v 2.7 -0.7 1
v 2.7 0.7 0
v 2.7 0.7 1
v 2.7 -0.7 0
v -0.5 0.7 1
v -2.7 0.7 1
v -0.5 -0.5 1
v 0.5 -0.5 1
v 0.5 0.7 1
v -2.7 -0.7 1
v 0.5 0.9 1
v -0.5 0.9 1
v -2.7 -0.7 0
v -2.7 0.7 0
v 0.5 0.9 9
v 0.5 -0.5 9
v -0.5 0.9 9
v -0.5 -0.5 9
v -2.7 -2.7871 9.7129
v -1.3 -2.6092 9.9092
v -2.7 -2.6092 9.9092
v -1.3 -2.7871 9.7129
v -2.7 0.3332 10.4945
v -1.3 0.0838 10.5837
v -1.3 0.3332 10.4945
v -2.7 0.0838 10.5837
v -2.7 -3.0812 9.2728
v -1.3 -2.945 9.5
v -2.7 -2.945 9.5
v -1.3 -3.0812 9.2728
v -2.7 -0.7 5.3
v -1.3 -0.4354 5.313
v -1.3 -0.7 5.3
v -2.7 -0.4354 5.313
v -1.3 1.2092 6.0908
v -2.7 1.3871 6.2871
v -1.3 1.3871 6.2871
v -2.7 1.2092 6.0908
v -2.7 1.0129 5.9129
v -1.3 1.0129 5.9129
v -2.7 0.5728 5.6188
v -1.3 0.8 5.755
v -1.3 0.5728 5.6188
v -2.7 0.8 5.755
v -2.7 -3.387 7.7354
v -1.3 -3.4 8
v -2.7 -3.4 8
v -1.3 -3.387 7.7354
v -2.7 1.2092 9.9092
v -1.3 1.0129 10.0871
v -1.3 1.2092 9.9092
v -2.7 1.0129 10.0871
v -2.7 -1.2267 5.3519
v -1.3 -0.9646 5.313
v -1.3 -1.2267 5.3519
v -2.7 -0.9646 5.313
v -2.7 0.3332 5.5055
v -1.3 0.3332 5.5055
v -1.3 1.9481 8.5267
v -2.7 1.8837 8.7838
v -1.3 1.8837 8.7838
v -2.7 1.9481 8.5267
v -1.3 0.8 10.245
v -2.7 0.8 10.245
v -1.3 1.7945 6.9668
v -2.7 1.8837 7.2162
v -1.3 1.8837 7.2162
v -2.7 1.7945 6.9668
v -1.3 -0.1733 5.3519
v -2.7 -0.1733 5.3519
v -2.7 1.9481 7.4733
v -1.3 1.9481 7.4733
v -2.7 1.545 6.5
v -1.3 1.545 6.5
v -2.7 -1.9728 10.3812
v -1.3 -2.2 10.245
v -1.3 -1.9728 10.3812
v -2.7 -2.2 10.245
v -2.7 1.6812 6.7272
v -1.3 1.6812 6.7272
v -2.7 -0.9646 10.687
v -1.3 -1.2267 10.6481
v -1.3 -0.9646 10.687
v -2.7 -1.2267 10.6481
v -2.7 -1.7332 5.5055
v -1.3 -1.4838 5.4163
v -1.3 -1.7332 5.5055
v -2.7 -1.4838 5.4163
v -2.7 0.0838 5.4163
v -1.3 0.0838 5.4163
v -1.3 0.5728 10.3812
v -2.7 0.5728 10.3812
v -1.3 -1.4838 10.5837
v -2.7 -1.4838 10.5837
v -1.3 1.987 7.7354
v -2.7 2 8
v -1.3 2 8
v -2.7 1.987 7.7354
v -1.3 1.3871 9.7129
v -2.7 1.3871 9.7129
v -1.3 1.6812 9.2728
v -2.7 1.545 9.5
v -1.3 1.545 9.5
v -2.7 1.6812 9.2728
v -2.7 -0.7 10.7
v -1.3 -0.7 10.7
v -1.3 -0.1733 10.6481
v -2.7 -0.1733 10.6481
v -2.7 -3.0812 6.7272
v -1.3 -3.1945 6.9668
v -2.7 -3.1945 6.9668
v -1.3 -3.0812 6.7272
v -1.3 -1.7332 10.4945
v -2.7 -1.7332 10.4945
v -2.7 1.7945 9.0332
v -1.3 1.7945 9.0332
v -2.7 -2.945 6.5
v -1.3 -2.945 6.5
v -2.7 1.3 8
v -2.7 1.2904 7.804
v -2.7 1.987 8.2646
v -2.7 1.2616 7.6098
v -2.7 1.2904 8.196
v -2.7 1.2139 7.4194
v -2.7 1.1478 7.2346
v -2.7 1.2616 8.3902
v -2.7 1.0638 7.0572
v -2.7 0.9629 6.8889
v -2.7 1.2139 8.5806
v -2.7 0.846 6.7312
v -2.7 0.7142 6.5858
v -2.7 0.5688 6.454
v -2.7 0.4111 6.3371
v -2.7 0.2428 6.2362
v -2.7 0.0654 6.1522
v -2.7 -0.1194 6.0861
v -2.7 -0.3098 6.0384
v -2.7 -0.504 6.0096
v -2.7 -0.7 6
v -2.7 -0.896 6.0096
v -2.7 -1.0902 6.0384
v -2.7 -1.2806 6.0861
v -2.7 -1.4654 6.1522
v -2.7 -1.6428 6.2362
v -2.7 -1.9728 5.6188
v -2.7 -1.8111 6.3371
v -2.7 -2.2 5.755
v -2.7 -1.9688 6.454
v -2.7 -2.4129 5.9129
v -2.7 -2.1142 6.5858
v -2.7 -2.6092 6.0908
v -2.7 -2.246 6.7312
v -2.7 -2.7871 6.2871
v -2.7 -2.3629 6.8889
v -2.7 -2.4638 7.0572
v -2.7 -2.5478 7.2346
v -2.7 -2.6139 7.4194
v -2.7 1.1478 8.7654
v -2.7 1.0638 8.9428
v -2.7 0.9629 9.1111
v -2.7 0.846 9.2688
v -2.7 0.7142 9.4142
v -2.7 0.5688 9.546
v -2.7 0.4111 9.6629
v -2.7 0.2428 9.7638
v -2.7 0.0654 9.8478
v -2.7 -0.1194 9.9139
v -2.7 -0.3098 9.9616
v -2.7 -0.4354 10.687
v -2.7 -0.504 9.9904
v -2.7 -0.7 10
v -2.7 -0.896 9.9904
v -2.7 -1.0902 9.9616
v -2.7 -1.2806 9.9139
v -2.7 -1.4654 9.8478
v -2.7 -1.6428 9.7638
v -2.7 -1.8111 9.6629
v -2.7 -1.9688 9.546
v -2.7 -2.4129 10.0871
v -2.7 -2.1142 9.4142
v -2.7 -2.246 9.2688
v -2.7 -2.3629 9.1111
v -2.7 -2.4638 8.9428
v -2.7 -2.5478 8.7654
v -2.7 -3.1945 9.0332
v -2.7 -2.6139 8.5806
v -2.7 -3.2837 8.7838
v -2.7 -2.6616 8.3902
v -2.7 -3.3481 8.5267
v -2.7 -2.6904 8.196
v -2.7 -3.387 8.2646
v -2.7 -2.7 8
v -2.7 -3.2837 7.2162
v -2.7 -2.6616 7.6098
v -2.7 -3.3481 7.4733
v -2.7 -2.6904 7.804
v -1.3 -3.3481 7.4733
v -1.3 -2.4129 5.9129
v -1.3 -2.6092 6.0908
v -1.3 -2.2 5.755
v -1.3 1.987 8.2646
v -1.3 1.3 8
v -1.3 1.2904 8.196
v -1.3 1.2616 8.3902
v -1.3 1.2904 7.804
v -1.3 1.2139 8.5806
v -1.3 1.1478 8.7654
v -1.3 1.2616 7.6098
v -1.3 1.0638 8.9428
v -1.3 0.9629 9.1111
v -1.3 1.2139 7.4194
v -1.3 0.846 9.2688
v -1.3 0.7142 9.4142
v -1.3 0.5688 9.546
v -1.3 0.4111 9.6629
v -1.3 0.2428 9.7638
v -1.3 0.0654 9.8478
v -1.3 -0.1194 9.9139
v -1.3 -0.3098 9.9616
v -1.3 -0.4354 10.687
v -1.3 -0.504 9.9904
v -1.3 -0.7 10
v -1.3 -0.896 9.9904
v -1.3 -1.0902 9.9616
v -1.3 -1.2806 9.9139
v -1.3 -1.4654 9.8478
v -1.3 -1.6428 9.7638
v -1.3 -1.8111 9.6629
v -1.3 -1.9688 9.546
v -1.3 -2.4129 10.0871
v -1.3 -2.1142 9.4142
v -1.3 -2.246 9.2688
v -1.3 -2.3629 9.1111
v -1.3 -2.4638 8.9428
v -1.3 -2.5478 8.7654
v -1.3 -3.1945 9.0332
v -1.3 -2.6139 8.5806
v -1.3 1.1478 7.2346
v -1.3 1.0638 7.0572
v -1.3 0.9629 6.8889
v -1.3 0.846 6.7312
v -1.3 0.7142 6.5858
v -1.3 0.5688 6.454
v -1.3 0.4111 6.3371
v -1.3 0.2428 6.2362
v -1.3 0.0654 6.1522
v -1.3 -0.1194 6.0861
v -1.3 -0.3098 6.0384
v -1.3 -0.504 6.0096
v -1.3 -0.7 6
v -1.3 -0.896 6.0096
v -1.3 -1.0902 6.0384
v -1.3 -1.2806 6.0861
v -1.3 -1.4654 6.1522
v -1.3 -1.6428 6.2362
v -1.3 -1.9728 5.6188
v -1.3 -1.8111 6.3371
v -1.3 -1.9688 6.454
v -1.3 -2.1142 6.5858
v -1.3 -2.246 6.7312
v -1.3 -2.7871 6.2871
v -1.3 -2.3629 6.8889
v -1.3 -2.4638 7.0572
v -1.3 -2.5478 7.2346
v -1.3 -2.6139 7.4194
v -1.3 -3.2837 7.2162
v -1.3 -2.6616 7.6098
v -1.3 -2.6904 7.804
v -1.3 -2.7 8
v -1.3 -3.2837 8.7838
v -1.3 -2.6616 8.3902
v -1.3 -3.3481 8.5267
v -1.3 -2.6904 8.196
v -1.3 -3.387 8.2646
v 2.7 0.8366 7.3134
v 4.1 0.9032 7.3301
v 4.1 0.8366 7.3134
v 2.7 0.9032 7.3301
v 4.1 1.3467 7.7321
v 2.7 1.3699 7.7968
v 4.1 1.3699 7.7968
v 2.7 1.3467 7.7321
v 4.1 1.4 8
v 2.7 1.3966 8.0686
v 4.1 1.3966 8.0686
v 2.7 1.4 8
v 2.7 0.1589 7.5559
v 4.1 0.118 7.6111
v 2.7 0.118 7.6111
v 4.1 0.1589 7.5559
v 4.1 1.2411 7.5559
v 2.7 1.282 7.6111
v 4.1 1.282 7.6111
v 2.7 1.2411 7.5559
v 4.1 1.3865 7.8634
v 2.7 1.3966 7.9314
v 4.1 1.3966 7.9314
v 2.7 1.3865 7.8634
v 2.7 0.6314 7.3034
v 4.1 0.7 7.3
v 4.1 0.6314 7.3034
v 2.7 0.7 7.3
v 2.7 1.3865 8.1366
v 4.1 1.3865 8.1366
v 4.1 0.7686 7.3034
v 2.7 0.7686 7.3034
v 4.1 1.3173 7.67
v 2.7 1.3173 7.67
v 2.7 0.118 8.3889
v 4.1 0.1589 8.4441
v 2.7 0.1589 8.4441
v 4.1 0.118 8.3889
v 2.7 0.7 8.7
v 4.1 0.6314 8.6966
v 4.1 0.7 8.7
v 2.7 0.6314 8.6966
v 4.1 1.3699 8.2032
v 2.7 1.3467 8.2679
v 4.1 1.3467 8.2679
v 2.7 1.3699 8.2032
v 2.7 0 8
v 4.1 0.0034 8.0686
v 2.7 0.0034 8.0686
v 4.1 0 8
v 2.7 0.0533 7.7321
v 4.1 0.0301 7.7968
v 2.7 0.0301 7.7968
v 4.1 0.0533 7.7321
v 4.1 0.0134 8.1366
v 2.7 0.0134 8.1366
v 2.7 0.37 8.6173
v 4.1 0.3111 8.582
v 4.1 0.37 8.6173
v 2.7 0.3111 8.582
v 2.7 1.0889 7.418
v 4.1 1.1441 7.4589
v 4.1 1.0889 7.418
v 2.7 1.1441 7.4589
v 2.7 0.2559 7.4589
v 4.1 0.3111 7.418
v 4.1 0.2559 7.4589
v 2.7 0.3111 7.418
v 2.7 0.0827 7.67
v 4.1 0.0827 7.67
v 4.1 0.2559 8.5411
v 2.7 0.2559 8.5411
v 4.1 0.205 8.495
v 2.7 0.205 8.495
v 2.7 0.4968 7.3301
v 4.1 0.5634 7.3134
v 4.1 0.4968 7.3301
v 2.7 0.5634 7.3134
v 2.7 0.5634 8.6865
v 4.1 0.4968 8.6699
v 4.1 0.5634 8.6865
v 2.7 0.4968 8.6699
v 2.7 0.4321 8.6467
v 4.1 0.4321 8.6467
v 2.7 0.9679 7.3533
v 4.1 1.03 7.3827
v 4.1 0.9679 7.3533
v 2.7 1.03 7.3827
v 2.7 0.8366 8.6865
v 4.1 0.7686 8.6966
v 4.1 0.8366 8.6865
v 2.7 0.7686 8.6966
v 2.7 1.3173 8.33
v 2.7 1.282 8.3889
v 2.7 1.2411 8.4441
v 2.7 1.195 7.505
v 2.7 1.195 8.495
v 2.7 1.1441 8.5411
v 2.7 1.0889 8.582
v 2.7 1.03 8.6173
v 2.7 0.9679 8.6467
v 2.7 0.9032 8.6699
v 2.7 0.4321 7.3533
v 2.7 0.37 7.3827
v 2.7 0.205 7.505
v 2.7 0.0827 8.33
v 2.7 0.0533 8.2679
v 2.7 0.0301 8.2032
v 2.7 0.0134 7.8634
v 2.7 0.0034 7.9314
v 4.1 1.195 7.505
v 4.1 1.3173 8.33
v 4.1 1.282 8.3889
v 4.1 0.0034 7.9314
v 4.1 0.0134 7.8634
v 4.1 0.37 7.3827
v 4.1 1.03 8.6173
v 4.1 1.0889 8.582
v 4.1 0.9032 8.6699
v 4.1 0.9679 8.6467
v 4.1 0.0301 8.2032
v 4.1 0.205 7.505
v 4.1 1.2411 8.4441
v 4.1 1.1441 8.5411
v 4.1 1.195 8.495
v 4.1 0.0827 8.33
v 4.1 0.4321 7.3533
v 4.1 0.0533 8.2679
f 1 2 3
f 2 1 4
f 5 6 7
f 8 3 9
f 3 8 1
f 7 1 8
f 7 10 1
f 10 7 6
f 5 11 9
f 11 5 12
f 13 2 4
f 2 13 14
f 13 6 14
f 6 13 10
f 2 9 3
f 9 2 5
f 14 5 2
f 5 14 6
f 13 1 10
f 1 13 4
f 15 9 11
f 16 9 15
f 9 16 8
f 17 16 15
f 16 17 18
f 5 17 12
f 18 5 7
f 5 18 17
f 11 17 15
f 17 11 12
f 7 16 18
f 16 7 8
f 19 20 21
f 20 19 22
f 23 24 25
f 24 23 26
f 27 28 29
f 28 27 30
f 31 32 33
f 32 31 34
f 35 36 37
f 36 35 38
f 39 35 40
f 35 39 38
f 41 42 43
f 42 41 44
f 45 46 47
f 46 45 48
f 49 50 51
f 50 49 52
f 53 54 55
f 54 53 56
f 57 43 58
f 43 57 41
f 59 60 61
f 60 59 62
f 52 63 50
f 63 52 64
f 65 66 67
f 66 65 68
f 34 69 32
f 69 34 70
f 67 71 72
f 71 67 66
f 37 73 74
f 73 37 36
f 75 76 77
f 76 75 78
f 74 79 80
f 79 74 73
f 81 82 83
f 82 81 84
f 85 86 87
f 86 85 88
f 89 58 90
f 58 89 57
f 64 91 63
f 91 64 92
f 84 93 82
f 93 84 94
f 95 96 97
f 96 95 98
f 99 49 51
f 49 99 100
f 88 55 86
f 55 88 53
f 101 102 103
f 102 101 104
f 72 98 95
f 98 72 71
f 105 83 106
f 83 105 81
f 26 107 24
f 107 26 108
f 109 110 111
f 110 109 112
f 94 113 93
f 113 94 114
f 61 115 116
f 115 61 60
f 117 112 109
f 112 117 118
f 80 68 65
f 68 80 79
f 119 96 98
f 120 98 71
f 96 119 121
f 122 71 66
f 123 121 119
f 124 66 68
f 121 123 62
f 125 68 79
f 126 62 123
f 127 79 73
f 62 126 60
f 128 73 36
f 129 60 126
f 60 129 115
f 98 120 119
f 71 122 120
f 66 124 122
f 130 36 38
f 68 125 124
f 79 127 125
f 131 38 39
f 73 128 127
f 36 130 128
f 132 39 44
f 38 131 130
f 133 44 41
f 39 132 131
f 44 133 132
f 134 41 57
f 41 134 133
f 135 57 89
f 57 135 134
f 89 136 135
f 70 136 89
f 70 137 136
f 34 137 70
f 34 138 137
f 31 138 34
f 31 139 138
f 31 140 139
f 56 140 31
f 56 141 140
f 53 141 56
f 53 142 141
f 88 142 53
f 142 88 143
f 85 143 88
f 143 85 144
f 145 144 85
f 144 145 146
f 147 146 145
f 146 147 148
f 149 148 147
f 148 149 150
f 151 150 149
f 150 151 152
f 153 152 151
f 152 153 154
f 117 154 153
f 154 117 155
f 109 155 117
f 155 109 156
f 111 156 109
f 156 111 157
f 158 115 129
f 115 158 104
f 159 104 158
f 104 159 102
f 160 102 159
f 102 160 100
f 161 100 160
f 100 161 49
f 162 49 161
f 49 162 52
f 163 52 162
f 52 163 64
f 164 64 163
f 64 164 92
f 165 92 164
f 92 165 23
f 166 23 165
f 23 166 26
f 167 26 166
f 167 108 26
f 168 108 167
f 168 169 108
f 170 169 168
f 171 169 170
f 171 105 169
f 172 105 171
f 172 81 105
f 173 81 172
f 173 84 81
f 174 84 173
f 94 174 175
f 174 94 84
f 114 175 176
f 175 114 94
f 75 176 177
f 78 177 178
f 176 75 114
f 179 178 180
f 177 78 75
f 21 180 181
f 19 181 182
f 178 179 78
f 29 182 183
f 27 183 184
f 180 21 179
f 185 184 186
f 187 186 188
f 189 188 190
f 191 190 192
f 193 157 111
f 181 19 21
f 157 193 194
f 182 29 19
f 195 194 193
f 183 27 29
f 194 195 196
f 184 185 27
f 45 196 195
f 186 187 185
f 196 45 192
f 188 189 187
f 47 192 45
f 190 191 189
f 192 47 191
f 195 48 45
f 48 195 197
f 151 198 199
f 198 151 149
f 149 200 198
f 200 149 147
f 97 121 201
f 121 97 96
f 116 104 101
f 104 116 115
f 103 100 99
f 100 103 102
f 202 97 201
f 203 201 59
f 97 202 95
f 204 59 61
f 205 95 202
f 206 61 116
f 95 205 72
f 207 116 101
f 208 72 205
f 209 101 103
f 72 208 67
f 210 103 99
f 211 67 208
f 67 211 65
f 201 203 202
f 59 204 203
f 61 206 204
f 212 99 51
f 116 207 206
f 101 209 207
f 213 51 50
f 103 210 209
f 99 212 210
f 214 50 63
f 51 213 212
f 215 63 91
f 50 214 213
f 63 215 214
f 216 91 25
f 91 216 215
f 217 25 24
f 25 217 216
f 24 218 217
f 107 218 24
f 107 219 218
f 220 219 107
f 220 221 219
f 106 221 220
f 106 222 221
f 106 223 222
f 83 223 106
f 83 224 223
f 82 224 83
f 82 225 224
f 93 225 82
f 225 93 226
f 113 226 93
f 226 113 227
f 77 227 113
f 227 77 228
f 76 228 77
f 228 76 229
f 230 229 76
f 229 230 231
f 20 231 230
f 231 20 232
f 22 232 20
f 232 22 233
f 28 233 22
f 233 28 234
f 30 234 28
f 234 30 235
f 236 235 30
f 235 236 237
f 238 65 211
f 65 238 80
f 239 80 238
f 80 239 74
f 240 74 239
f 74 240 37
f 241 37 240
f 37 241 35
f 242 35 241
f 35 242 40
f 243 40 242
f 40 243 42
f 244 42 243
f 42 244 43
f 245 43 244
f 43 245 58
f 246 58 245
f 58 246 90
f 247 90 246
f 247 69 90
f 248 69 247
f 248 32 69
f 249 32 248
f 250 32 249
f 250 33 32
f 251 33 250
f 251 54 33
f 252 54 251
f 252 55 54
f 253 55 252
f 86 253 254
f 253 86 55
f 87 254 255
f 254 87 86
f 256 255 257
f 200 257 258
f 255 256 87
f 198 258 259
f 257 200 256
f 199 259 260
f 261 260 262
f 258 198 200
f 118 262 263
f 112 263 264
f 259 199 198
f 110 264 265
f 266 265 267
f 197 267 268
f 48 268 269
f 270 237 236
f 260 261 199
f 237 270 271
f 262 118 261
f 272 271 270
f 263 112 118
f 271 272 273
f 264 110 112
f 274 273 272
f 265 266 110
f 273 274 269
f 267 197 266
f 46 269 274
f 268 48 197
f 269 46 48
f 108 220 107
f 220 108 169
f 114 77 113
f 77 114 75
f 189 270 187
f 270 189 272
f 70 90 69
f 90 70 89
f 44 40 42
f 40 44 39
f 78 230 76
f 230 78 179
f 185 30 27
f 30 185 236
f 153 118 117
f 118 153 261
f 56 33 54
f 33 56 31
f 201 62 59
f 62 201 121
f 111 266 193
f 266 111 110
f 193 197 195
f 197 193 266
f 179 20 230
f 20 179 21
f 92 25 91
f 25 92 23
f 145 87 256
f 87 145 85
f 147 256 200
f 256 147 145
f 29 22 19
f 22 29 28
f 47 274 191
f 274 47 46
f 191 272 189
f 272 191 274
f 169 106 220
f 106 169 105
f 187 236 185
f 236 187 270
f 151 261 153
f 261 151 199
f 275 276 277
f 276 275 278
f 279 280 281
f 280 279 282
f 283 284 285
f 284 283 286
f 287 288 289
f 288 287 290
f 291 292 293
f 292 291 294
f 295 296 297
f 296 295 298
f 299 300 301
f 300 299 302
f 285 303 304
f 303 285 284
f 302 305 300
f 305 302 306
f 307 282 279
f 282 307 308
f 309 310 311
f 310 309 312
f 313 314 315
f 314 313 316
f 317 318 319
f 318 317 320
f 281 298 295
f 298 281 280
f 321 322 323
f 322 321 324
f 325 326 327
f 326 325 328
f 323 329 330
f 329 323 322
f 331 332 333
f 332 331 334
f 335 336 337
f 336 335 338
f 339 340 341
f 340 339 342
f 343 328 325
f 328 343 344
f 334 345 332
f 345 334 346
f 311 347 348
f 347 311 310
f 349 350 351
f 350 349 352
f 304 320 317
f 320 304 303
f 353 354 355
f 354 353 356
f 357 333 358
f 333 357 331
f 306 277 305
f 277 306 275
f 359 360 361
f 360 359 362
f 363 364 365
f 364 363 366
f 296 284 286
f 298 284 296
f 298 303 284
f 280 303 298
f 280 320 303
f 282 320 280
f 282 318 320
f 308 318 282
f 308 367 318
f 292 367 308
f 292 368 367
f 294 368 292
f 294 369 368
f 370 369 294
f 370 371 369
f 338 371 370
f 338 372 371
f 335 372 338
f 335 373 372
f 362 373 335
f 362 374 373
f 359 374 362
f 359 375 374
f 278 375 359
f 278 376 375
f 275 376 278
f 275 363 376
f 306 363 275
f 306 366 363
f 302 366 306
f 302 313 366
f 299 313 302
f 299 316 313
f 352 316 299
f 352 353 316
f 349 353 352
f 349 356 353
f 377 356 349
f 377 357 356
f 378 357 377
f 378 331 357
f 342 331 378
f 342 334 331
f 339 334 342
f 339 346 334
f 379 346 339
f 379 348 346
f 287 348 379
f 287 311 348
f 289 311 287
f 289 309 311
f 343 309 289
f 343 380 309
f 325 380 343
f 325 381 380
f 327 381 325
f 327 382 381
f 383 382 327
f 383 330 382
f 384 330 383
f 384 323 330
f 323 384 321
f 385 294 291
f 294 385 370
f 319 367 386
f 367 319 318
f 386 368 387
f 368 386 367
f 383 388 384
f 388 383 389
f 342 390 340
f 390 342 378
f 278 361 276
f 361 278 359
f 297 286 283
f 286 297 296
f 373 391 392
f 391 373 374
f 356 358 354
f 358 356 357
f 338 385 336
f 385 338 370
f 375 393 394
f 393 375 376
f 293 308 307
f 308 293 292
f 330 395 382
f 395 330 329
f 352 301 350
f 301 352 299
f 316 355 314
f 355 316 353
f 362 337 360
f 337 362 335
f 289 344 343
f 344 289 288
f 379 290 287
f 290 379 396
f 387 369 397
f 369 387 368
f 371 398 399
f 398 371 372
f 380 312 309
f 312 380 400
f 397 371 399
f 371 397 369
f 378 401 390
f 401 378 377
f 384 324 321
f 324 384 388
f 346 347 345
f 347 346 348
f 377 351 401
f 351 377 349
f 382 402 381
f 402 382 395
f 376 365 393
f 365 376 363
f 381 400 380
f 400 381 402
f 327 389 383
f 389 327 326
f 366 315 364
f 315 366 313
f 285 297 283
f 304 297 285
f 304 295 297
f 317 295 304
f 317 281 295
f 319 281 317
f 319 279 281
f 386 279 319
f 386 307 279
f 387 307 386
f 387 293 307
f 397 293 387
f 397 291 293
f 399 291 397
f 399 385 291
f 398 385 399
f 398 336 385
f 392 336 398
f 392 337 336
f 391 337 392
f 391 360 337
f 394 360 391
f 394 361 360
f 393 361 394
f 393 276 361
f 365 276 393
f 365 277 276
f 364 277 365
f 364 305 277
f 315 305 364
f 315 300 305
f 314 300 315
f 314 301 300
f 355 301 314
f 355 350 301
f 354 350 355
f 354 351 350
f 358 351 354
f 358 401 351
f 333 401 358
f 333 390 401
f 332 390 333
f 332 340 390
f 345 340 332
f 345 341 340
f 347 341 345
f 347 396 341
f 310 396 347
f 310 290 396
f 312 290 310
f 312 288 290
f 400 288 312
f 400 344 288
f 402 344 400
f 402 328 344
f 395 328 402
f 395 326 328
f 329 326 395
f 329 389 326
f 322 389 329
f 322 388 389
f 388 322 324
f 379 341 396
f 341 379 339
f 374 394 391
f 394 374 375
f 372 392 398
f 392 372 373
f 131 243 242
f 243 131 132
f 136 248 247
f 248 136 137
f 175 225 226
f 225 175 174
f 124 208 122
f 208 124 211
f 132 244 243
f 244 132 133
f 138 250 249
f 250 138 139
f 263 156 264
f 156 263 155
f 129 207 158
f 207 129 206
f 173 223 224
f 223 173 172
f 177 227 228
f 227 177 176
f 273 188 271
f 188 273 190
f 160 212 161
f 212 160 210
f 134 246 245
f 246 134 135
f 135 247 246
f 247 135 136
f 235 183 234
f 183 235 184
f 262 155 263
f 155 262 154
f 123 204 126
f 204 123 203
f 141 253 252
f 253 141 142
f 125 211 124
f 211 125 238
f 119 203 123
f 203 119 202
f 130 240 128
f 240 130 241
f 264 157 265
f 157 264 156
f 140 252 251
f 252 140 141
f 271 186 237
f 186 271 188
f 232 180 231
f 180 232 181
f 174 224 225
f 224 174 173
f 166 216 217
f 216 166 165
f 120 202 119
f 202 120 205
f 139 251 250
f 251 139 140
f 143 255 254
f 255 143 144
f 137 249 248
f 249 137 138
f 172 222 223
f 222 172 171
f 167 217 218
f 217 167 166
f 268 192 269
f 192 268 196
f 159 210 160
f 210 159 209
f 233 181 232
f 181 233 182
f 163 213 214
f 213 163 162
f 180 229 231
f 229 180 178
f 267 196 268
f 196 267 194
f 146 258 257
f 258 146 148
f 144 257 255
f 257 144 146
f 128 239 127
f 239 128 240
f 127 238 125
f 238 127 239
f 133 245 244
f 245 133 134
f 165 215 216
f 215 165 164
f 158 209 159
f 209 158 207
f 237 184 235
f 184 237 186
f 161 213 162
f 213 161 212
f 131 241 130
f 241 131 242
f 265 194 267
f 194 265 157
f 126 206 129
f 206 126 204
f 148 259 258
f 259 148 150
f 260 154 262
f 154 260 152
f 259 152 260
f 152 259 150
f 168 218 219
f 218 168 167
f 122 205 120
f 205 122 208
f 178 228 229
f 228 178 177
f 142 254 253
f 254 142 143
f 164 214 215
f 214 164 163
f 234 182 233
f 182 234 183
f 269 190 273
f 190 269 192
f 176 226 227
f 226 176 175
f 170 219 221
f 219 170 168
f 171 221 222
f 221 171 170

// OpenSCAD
module mounting_clip() {
    difference() {
        union() {
            // Base plate
            translate([-2.7, -0.7, 0])
            cube([5.4, 1.4, 1.0]);

            // Central raised spine
            translate([-0.5, -0.5, 1.0])
            cube([1.0, 1.4, 8.0]);

            // U-shaped cradle
            translate([-2.7, -0.7, 8.0])
            rotate([0, 90, 0])
            cylinder(h=1.4, r=2.7, $fn=64);

            // End nubs
            translate([-2.7, 0.7, 8.0])
            rotate([0, 90, 0])
            cylinder(h=1.4, r=0.7, $fn=64);

            translate([2.7, 0.7, 8.0])
            rotate([0, 90, 0])
            cylinder(h=1.4, r=0.7, $fn=64);
        }
        // Cut out the inner part of the U-shaped cradle
        translate([-2.7, -0.7, 8.0])
        rotate([0, 90, 0])
        cylinder(h=1.4, r=2.0, $fn=64);
    }
}

mounting_clip();
